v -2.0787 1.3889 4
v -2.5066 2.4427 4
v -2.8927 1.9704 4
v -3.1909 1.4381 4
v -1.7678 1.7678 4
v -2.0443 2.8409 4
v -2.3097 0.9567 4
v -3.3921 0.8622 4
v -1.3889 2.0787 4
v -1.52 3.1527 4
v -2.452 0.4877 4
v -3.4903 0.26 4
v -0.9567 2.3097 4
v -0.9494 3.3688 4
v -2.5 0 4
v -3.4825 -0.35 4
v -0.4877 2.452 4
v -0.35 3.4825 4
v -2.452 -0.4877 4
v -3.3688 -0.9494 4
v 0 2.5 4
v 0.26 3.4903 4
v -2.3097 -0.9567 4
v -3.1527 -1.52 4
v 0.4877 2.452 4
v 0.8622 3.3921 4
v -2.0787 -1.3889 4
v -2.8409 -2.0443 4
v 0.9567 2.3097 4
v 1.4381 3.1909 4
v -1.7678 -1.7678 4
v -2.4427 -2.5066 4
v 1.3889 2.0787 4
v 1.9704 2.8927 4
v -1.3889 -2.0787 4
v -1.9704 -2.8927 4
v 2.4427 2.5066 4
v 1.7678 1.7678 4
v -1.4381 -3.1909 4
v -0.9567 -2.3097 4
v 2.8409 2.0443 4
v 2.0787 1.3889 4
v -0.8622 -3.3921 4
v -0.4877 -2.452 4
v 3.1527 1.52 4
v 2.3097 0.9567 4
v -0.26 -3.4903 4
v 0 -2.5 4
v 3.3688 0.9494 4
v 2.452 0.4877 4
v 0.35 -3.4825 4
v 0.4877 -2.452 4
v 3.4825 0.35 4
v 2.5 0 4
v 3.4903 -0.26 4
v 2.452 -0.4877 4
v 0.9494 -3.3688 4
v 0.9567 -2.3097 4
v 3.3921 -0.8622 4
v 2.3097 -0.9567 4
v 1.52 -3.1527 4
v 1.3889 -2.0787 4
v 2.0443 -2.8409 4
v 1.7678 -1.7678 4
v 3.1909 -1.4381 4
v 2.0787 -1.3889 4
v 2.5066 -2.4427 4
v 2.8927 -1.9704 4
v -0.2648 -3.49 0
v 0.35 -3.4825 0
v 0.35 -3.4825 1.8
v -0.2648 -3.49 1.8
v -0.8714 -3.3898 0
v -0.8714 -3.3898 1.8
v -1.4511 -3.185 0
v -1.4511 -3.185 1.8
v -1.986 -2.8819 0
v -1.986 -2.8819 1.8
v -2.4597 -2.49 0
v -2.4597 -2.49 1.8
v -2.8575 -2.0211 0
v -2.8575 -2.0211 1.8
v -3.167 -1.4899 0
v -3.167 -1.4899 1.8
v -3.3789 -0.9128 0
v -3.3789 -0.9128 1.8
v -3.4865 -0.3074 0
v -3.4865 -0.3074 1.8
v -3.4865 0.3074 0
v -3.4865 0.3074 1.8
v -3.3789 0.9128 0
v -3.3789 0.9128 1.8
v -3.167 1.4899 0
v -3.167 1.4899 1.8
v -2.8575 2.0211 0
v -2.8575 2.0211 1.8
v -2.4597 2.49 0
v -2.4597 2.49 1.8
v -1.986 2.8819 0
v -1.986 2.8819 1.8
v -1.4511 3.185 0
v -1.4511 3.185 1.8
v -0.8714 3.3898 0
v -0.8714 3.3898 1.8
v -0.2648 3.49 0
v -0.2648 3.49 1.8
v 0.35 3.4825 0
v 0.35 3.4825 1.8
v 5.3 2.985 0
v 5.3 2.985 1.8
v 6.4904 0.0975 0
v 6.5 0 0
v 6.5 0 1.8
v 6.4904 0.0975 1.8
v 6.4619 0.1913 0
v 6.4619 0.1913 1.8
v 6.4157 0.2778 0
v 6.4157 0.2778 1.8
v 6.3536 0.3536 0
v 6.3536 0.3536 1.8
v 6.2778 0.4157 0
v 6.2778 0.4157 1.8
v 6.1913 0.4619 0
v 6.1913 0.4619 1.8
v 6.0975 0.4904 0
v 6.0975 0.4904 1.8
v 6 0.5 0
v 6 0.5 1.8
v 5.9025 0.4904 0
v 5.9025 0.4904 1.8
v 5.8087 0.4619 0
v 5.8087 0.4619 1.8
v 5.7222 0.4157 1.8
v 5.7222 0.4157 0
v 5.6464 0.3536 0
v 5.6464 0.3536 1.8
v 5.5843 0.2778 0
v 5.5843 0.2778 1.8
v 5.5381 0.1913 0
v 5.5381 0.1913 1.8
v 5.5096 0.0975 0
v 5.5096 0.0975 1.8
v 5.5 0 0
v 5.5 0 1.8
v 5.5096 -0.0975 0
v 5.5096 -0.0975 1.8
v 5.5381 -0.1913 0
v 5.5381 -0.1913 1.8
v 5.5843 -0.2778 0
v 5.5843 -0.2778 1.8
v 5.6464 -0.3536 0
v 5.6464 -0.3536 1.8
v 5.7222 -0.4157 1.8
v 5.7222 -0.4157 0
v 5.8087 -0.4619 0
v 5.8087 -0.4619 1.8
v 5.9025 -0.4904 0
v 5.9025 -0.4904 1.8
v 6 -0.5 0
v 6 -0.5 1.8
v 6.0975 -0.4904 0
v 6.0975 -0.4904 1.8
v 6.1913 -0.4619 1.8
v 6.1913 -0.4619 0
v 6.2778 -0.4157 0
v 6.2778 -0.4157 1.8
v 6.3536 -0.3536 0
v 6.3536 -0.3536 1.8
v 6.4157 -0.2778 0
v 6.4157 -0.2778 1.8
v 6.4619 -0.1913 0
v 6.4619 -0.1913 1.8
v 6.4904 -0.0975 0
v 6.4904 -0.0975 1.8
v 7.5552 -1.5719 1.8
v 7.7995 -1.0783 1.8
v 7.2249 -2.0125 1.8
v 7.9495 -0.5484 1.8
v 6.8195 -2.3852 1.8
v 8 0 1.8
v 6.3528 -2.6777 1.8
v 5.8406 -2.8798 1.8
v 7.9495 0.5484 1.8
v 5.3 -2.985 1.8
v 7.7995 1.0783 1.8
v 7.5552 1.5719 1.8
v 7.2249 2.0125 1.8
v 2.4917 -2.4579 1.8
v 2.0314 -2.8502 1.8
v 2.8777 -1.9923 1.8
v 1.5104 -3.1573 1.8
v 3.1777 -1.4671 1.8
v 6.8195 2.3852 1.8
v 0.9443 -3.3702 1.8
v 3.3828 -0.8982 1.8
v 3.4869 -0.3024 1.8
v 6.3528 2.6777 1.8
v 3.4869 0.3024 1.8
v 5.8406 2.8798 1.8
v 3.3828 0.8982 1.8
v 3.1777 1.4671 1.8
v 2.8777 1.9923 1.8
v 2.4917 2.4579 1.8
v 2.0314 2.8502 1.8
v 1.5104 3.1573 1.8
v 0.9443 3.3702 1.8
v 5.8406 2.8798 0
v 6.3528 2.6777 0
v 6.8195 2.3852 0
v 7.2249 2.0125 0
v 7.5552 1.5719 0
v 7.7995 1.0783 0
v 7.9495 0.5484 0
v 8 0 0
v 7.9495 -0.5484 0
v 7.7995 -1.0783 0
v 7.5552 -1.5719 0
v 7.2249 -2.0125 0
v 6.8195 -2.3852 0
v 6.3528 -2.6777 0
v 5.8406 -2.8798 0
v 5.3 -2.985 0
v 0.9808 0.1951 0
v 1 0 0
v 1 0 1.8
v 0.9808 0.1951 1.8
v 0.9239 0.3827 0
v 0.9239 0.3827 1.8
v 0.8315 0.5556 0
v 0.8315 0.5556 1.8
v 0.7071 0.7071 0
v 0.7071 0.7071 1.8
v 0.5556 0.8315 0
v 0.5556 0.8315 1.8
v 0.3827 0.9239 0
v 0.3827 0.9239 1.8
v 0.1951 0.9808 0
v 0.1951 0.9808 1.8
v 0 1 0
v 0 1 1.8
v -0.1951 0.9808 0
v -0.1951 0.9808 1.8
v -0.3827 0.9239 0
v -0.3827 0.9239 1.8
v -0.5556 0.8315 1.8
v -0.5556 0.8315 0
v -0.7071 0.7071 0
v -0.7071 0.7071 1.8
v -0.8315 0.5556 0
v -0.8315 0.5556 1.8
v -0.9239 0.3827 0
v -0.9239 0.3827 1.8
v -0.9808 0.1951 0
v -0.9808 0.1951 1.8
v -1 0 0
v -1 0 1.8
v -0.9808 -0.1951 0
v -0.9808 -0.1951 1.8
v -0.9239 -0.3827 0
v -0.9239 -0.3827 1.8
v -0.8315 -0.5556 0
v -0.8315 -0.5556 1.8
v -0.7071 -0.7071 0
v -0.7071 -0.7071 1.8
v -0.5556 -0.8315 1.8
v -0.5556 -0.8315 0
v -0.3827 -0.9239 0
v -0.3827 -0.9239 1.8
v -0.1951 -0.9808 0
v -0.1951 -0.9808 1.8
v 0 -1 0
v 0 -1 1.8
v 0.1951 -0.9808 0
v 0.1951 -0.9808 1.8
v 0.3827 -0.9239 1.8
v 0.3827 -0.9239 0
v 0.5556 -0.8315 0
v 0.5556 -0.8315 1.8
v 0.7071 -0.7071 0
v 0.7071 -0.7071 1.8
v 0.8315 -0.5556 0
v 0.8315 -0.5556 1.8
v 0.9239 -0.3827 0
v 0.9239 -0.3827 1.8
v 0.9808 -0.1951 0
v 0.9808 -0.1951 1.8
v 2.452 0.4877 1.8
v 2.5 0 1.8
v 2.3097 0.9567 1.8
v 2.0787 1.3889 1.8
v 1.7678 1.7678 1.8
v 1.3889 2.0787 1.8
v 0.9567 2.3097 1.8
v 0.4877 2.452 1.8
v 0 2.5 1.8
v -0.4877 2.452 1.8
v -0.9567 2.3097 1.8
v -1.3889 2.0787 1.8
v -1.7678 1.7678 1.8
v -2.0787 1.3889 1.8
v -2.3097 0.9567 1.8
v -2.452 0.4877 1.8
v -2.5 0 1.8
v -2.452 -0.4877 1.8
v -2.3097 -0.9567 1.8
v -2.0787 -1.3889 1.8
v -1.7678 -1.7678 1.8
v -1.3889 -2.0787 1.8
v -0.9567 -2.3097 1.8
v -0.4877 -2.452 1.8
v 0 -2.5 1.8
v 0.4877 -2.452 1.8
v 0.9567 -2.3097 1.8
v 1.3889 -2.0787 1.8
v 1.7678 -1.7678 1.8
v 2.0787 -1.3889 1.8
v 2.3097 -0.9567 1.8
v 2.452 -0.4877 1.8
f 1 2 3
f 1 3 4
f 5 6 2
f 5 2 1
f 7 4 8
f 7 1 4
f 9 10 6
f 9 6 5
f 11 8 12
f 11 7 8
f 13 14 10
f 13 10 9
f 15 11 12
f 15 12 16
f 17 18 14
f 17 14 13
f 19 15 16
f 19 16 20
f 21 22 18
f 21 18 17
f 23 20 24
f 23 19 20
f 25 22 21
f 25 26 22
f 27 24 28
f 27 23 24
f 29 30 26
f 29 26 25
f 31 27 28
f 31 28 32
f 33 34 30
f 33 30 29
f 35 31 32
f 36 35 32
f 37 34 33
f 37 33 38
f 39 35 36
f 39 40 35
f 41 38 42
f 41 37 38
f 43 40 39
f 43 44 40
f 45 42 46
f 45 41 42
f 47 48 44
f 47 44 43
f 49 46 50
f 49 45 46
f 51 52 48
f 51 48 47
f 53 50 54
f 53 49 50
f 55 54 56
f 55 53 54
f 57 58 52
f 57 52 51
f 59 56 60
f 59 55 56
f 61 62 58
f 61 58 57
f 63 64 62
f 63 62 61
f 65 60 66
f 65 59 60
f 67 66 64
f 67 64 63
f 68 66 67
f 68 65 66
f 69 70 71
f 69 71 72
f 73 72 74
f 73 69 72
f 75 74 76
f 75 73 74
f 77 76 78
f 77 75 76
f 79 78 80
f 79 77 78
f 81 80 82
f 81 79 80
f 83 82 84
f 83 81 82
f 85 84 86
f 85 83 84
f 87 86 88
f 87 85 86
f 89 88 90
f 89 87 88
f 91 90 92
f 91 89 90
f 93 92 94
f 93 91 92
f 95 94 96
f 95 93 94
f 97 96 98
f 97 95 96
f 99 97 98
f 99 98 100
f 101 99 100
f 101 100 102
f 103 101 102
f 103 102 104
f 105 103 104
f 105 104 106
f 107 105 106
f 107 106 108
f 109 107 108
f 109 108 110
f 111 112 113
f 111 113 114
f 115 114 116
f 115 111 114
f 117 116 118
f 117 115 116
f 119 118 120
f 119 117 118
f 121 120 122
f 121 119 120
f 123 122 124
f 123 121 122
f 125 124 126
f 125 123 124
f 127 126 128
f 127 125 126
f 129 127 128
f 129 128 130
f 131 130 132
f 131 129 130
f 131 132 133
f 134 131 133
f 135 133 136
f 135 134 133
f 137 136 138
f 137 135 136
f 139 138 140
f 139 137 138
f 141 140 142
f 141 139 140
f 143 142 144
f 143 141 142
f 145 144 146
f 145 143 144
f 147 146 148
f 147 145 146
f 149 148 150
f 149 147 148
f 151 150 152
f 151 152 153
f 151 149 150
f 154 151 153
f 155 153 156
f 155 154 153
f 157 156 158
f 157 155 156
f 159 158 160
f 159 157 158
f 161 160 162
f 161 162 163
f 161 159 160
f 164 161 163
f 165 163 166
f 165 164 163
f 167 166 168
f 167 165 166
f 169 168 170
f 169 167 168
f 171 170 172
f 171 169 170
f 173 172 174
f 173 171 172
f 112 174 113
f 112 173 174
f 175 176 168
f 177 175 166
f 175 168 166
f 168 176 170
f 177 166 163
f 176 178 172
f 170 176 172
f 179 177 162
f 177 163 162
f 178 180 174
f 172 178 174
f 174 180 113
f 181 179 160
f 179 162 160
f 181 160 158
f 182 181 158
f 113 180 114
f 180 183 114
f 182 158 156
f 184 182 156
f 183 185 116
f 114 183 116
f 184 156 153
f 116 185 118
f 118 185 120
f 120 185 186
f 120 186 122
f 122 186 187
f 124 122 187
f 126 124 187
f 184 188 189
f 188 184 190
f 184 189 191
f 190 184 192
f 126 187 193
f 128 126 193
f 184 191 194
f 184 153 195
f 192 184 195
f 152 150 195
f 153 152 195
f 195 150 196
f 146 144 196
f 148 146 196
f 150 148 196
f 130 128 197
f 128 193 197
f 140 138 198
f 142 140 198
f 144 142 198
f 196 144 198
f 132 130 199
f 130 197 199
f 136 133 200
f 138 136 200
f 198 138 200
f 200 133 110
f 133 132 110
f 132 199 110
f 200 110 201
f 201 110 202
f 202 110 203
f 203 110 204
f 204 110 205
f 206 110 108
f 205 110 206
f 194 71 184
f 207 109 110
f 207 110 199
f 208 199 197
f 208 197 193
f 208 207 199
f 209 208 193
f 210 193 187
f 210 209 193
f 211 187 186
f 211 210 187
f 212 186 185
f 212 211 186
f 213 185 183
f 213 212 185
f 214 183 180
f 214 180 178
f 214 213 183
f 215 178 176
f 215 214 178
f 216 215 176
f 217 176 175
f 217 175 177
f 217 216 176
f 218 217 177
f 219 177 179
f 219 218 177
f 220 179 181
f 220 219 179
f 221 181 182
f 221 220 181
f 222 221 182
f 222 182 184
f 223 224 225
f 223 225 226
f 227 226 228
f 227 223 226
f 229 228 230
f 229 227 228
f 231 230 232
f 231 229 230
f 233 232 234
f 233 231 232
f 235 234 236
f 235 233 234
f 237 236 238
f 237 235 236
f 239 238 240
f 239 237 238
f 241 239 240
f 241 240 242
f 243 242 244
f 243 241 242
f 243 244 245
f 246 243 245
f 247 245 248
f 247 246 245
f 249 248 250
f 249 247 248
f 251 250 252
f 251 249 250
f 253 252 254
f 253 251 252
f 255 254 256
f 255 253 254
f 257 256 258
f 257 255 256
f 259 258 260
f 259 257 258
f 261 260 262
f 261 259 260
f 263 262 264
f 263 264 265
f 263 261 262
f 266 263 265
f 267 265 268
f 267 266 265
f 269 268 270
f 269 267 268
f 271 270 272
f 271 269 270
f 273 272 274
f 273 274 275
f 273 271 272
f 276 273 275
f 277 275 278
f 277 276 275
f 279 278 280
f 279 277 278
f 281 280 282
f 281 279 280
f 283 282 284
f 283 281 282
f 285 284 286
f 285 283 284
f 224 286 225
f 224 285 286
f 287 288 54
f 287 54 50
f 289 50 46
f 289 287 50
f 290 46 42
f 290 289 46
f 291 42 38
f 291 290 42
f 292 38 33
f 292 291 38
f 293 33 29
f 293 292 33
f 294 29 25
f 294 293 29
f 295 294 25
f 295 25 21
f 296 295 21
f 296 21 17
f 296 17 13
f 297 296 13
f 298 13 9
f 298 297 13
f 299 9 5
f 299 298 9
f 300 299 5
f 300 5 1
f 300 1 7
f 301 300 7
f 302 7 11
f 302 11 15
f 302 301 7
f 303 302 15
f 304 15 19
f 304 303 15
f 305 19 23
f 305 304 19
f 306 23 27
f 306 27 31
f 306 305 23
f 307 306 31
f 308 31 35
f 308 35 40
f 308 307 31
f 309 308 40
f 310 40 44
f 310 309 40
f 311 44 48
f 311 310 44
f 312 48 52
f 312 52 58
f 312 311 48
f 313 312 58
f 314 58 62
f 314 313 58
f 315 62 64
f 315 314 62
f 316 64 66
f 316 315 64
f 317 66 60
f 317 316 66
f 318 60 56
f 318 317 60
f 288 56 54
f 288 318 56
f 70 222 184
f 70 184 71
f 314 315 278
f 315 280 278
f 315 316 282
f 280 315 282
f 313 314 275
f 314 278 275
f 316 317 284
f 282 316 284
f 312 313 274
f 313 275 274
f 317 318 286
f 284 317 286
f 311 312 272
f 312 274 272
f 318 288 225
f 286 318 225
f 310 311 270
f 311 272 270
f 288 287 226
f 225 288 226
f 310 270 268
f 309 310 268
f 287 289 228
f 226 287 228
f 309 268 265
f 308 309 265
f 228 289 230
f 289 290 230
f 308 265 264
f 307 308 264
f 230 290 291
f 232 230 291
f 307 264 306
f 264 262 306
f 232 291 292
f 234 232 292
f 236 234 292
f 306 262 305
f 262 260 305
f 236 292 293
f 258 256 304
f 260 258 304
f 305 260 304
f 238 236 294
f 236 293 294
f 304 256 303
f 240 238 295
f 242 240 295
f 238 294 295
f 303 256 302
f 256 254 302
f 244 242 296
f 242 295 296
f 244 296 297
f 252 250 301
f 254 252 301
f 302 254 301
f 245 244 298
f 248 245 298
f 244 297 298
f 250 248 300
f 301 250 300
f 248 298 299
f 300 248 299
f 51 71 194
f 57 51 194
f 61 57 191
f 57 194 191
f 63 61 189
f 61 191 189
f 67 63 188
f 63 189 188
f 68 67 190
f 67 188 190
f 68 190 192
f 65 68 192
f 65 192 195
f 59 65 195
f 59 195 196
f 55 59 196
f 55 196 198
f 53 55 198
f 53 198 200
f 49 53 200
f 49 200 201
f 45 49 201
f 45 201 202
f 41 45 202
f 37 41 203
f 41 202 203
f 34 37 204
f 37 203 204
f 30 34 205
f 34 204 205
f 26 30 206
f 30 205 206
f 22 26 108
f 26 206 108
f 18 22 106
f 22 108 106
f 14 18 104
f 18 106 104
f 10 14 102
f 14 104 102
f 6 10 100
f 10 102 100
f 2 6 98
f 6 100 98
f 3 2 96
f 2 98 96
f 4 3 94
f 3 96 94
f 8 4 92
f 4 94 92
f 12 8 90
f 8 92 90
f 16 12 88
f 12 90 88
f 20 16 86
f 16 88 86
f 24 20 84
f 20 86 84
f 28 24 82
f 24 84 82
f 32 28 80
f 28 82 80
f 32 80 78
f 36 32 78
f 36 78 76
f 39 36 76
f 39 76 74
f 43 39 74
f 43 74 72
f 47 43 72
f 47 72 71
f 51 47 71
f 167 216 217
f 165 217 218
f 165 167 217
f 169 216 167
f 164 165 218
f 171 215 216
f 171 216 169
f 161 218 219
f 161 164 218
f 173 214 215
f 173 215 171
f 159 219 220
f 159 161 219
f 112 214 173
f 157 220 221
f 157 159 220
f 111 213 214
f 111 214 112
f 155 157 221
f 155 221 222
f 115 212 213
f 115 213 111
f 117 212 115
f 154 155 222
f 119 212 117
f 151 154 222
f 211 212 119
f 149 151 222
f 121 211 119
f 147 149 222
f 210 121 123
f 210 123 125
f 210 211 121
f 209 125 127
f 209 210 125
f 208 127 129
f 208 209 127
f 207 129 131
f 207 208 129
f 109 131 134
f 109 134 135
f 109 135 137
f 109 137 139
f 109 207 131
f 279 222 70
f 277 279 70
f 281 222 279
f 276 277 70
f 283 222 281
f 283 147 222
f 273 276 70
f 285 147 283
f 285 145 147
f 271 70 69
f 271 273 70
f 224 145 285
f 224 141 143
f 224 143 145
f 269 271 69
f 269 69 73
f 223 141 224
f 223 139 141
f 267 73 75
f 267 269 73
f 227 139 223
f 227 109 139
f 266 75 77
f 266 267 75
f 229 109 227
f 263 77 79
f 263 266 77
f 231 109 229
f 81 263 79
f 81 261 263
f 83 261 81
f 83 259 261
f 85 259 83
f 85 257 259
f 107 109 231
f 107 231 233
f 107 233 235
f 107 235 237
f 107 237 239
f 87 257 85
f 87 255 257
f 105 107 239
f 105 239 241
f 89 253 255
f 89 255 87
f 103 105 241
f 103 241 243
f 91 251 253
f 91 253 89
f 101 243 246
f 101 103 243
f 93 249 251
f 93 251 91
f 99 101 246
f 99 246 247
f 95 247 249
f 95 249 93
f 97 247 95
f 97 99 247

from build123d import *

# Parameters (mm, degrees)
SKETCH1_R           = 1
SKETCH1_R_2         = 0.5
BOSS_EXTRUDE3_DEPTH = 1.8
SKETCH4_R           = 3.5
SKETCH4_R_2         = 2.5
BOSS_EXTRUDE4_DEPTH = 2.2


with BuildPart() as part:
    # Sketch1 → Boss-Extrude3 (new body)
    with BuildSketch(Plane.XY):
        with BuildLine():
            Line((0.35, 3.48245603), (5.3, 2.984962311))
            ThreePointArc((5.3, 2.984962311), (8, 0), (5.3, -2.984962311))
            Line((5.3, -2.984962311), (0.35, -3.48245603))
            ThreePointArc((0.35, -3.48245603), (-3.5, 0), (0.35, 3.48245603))
        make_face()
        Circle(SKETCH1_R, mode=Mode.SUBTRACT)
        with Locations((6, 0)):
            Circle(SKETCH1_R_2, mode=Mode.SUBTRACT)
    extrude(amount=BOSS_EXTRUDE3_DEPTH)

    # Sketch4 → Boss-Extrude4 (add)
    with BuildSketch(Plane.XY.offset(1.8)):
        with Locations(Location((0, 0, 0), (0, 0, 275.739170477))):
            Circle(SKETCH4_R)
        Circle(SKETCH4_R_2, mode=Mode.SUBTRACT)
    extrude(amount=BOSS_EXTRUDE4_DEPTH)


solid = part.part
